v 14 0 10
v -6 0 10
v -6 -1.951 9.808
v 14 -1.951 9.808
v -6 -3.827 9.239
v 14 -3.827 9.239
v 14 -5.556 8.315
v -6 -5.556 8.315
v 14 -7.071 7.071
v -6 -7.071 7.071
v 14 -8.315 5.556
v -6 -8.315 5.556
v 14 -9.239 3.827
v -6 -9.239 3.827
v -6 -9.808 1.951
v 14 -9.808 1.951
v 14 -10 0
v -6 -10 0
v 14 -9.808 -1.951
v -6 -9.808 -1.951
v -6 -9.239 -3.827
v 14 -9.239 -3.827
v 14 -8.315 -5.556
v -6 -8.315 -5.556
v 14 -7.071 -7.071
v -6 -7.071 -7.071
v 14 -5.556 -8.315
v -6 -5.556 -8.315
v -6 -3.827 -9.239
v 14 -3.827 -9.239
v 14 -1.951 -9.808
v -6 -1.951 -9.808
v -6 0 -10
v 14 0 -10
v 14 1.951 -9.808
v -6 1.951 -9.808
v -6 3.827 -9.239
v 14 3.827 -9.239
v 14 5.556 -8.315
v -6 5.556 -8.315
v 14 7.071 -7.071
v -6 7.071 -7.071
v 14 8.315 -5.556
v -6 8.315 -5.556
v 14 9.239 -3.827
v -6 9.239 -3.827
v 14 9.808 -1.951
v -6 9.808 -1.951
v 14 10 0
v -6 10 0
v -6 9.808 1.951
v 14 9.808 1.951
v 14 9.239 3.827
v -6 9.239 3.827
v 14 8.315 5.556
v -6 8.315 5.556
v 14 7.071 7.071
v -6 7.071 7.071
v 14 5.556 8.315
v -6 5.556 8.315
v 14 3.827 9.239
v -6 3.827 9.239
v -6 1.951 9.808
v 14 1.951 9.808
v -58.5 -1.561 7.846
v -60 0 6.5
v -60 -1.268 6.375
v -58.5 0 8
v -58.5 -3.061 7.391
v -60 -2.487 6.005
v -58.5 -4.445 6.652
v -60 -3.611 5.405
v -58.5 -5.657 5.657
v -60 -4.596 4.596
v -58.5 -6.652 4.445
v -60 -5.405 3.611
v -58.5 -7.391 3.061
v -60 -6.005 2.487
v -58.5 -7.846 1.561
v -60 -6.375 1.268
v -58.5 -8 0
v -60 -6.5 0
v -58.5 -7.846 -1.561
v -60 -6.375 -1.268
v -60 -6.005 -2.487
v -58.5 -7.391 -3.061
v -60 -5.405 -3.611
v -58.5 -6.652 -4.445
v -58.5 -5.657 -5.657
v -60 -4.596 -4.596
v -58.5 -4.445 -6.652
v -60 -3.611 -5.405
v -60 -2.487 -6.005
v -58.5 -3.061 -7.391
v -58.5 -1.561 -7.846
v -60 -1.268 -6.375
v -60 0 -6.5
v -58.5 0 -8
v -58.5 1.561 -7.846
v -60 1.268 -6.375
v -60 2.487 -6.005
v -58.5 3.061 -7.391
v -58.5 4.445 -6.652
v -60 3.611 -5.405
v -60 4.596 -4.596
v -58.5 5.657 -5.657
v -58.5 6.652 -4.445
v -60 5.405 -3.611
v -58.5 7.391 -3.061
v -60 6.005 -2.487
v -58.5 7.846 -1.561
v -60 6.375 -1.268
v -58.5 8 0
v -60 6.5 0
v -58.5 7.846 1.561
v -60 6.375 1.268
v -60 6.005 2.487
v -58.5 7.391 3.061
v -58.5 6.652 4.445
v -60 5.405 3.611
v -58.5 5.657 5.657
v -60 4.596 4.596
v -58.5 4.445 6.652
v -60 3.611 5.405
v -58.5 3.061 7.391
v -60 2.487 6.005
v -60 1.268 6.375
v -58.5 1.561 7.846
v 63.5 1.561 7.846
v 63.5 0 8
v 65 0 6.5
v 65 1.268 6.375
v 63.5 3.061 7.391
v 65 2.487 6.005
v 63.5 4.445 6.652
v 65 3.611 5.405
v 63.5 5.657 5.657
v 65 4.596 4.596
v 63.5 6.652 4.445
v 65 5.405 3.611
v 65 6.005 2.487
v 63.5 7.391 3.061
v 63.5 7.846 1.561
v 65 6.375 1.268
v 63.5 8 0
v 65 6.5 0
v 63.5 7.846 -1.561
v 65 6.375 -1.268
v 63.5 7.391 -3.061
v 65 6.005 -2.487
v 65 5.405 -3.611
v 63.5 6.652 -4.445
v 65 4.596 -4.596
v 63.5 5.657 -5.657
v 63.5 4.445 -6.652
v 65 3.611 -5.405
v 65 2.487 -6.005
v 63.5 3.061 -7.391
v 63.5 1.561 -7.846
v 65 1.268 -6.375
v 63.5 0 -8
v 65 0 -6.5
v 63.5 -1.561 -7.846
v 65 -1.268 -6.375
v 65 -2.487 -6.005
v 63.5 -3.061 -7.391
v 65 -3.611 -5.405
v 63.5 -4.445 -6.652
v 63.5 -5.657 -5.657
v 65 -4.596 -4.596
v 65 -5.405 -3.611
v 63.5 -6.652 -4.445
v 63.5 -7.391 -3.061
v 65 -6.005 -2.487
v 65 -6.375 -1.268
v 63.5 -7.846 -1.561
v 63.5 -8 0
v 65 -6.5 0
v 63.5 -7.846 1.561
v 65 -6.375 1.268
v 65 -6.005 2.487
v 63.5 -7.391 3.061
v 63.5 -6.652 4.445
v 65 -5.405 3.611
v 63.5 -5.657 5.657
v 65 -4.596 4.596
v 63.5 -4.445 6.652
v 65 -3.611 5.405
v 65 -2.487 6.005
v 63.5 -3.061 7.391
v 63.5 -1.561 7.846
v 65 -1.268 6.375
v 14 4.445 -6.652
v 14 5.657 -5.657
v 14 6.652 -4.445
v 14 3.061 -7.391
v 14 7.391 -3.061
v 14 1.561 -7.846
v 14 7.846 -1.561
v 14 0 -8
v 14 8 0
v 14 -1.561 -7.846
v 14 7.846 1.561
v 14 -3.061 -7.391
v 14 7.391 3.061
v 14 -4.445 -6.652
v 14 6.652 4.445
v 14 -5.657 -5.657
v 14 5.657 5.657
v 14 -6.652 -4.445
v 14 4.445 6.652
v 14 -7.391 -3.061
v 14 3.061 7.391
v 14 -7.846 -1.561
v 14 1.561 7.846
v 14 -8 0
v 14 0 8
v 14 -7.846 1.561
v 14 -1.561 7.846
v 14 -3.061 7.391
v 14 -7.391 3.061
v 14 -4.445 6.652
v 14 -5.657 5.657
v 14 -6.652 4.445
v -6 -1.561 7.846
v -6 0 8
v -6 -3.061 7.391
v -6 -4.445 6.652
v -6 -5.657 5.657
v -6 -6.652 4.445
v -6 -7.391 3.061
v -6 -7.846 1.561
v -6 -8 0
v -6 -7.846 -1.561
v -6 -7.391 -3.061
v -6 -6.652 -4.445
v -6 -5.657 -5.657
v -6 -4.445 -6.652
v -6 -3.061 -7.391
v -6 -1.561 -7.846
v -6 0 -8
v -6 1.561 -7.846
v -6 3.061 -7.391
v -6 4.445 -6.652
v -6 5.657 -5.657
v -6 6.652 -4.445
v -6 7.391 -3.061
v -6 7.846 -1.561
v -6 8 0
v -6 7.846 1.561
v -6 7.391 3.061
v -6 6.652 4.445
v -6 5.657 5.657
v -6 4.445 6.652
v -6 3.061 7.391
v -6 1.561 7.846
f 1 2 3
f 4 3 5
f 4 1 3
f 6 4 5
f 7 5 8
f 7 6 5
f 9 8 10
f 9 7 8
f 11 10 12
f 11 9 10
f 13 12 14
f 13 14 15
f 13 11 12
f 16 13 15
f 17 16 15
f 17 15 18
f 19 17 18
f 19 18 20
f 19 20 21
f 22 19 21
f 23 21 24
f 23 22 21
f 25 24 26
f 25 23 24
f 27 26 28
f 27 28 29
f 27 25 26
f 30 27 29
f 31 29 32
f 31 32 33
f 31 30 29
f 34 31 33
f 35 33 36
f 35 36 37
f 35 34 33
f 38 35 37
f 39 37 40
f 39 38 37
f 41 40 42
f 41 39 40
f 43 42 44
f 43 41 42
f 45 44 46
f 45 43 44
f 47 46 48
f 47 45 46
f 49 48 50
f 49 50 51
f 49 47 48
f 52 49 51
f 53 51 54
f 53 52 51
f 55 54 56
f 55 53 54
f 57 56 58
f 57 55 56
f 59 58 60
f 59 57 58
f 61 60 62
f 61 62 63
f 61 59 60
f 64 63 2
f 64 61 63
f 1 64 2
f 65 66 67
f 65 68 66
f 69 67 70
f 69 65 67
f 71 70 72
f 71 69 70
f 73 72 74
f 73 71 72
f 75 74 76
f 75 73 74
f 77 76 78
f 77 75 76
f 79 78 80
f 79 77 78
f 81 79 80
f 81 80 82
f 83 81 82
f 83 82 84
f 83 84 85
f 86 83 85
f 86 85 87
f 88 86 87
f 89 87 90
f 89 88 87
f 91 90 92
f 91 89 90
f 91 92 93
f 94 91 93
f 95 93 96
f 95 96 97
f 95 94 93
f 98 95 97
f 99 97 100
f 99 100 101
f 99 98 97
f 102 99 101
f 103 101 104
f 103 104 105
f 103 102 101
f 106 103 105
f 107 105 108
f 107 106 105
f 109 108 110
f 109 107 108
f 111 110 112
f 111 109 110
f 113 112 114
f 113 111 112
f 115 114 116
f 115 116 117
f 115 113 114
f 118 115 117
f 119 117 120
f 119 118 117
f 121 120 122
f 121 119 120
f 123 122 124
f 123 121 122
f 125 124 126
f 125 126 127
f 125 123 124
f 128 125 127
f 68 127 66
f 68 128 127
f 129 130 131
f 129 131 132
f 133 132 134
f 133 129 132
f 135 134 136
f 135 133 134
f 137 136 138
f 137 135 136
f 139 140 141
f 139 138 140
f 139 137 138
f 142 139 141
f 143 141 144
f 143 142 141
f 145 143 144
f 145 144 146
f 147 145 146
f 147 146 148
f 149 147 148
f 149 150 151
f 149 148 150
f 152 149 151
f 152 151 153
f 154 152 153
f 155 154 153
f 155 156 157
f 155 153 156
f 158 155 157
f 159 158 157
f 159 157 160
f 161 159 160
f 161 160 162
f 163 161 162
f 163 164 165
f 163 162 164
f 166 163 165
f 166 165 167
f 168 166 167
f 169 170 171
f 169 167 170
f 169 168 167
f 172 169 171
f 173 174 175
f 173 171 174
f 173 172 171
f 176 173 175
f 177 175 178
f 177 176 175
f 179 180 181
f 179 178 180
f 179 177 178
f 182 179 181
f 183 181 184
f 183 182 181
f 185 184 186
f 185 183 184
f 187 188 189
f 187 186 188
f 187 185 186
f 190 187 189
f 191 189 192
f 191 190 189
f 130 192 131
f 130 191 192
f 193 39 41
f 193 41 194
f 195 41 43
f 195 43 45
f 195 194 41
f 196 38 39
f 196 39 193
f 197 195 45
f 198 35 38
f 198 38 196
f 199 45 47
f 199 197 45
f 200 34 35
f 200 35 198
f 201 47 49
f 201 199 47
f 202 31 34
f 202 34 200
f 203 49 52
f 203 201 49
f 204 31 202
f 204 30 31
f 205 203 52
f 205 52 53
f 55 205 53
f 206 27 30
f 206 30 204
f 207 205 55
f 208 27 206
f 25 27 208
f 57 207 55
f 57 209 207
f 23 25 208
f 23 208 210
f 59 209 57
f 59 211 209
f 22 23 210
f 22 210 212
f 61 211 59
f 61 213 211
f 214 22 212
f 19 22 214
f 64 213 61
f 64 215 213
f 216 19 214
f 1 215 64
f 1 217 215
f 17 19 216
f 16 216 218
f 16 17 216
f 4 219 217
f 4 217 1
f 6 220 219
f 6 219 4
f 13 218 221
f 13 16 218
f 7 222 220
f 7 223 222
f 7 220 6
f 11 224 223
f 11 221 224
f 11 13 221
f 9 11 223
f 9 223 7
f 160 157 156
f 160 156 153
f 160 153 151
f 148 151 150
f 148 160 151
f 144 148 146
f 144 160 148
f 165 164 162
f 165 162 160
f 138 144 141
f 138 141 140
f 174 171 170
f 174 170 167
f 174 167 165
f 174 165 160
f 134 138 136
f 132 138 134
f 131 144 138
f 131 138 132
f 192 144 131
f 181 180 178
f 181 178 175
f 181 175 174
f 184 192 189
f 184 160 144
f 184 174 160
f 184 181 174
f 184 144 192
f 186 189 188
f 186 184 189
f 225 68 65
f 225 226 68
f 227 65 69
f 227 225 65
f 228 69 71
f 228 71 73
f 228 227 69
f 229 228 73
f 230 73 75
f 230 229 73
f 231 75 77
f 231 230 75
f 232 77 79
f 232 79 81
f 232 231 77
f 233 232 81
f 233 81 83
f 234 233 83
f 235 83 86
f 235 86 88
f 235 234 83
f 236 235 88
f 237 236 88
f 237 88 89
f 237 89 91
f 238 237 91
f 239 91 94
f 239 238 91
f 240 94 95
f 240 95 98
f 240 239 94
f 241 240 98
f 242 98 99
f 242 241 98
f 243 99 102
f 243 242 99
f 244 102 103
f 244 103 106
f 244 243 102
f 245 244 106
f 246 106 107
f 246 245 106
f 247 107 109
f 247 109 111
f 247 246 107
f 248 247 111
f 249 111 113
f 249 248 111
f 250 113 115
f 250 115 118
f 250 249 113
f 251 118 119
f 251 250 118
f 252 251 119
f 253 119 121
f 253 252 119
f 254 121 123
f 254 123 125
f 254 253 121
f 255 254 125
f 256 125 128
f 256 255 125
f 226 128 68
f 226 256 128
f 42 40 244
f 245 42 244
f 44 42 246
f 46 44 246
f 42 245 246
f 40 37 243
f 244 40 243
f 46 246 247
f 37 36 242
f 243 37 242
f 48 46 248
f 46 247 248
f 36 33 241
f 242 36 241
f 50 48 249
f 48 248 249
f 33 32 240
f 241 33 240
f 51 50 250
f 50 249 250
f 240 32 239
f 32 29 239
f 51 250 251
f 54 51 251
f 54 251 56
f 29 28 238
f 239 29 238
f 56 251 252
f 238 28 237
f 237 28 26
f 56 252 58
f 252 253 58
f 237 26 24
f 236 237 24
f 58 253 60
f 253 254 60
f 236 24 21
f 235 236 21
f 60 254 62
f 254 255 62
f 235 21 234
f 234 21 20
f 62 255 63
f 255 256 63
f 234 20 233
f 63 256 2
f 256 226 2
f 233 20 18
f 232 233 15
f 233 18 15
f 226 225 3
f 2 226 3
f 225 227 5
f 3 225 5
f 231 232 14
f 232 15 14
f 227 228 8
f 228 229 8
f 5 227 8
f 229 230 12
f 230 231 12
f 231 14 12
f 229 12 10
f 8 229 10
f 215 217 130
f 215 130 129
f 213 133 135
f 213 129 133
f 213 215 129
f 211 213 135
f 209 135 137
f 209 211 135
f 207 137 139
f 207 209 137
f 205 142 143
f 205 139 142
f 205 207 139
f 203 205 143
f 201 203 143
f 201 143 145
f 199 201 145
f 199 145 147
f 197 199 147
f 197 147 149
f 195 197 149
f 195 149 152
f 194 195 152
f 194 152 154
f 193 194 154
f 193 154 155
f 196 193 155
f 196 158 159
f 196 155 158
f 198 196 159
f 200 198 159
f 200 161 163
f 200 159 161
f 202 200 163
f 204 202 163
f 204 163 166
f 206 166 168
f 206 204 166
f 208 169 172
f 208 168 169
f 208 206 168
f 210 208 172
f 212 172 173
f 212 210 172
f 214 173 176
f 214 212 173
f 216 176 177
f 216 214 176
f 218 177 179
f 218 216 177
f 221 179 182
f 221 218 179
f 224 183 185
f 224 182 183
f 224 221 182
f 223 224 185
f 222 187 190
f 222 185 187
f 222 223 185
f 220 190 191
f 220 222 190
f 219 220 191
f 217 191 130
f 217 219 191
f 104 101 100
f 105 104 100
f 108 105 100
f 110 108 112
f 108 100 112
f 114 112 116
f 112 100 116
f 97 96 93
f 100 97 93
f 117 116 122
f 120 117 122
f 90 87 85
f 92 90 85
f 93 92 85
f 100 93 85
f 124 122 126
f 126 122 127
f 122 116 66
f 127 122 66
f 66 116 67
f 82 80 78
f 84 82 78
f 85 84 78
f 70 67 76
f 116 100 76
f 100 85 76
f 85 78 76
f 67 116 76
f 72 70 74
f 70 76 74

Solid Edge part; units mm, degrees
sketch "Sketch1" plane through (0, 0, 0) normal (0, -1, 0) x (1, 0, 0)
  line L0 (-60, 0) -> (-60, 8)
  line L1 (-60, 8) -> (-6, 8)
  line L2 (-6, 8) -> (-6, 10)
  line L3 (-6, 10) -> (14, 10)
  line L4 (14, 10) -> (14, 8)
  line L5 (65, 8) -> (14, 8)
  line L6 (65, 0) -> (65, 8)
revolve "RevolvedProtrusion1" add sketch "Sketch1" angle 360 about axis through (-60, 0, 0) along (1, 0, 0)
cosmetic_thread "Thread1" size "M16"
cosmetic_thread "Thread_2" size "M16" thread depth 35
chamfer "Chamfer_1" distance 1.5 angle 45 2 edges at (-60, 0, -8) (65, 0, -8)
